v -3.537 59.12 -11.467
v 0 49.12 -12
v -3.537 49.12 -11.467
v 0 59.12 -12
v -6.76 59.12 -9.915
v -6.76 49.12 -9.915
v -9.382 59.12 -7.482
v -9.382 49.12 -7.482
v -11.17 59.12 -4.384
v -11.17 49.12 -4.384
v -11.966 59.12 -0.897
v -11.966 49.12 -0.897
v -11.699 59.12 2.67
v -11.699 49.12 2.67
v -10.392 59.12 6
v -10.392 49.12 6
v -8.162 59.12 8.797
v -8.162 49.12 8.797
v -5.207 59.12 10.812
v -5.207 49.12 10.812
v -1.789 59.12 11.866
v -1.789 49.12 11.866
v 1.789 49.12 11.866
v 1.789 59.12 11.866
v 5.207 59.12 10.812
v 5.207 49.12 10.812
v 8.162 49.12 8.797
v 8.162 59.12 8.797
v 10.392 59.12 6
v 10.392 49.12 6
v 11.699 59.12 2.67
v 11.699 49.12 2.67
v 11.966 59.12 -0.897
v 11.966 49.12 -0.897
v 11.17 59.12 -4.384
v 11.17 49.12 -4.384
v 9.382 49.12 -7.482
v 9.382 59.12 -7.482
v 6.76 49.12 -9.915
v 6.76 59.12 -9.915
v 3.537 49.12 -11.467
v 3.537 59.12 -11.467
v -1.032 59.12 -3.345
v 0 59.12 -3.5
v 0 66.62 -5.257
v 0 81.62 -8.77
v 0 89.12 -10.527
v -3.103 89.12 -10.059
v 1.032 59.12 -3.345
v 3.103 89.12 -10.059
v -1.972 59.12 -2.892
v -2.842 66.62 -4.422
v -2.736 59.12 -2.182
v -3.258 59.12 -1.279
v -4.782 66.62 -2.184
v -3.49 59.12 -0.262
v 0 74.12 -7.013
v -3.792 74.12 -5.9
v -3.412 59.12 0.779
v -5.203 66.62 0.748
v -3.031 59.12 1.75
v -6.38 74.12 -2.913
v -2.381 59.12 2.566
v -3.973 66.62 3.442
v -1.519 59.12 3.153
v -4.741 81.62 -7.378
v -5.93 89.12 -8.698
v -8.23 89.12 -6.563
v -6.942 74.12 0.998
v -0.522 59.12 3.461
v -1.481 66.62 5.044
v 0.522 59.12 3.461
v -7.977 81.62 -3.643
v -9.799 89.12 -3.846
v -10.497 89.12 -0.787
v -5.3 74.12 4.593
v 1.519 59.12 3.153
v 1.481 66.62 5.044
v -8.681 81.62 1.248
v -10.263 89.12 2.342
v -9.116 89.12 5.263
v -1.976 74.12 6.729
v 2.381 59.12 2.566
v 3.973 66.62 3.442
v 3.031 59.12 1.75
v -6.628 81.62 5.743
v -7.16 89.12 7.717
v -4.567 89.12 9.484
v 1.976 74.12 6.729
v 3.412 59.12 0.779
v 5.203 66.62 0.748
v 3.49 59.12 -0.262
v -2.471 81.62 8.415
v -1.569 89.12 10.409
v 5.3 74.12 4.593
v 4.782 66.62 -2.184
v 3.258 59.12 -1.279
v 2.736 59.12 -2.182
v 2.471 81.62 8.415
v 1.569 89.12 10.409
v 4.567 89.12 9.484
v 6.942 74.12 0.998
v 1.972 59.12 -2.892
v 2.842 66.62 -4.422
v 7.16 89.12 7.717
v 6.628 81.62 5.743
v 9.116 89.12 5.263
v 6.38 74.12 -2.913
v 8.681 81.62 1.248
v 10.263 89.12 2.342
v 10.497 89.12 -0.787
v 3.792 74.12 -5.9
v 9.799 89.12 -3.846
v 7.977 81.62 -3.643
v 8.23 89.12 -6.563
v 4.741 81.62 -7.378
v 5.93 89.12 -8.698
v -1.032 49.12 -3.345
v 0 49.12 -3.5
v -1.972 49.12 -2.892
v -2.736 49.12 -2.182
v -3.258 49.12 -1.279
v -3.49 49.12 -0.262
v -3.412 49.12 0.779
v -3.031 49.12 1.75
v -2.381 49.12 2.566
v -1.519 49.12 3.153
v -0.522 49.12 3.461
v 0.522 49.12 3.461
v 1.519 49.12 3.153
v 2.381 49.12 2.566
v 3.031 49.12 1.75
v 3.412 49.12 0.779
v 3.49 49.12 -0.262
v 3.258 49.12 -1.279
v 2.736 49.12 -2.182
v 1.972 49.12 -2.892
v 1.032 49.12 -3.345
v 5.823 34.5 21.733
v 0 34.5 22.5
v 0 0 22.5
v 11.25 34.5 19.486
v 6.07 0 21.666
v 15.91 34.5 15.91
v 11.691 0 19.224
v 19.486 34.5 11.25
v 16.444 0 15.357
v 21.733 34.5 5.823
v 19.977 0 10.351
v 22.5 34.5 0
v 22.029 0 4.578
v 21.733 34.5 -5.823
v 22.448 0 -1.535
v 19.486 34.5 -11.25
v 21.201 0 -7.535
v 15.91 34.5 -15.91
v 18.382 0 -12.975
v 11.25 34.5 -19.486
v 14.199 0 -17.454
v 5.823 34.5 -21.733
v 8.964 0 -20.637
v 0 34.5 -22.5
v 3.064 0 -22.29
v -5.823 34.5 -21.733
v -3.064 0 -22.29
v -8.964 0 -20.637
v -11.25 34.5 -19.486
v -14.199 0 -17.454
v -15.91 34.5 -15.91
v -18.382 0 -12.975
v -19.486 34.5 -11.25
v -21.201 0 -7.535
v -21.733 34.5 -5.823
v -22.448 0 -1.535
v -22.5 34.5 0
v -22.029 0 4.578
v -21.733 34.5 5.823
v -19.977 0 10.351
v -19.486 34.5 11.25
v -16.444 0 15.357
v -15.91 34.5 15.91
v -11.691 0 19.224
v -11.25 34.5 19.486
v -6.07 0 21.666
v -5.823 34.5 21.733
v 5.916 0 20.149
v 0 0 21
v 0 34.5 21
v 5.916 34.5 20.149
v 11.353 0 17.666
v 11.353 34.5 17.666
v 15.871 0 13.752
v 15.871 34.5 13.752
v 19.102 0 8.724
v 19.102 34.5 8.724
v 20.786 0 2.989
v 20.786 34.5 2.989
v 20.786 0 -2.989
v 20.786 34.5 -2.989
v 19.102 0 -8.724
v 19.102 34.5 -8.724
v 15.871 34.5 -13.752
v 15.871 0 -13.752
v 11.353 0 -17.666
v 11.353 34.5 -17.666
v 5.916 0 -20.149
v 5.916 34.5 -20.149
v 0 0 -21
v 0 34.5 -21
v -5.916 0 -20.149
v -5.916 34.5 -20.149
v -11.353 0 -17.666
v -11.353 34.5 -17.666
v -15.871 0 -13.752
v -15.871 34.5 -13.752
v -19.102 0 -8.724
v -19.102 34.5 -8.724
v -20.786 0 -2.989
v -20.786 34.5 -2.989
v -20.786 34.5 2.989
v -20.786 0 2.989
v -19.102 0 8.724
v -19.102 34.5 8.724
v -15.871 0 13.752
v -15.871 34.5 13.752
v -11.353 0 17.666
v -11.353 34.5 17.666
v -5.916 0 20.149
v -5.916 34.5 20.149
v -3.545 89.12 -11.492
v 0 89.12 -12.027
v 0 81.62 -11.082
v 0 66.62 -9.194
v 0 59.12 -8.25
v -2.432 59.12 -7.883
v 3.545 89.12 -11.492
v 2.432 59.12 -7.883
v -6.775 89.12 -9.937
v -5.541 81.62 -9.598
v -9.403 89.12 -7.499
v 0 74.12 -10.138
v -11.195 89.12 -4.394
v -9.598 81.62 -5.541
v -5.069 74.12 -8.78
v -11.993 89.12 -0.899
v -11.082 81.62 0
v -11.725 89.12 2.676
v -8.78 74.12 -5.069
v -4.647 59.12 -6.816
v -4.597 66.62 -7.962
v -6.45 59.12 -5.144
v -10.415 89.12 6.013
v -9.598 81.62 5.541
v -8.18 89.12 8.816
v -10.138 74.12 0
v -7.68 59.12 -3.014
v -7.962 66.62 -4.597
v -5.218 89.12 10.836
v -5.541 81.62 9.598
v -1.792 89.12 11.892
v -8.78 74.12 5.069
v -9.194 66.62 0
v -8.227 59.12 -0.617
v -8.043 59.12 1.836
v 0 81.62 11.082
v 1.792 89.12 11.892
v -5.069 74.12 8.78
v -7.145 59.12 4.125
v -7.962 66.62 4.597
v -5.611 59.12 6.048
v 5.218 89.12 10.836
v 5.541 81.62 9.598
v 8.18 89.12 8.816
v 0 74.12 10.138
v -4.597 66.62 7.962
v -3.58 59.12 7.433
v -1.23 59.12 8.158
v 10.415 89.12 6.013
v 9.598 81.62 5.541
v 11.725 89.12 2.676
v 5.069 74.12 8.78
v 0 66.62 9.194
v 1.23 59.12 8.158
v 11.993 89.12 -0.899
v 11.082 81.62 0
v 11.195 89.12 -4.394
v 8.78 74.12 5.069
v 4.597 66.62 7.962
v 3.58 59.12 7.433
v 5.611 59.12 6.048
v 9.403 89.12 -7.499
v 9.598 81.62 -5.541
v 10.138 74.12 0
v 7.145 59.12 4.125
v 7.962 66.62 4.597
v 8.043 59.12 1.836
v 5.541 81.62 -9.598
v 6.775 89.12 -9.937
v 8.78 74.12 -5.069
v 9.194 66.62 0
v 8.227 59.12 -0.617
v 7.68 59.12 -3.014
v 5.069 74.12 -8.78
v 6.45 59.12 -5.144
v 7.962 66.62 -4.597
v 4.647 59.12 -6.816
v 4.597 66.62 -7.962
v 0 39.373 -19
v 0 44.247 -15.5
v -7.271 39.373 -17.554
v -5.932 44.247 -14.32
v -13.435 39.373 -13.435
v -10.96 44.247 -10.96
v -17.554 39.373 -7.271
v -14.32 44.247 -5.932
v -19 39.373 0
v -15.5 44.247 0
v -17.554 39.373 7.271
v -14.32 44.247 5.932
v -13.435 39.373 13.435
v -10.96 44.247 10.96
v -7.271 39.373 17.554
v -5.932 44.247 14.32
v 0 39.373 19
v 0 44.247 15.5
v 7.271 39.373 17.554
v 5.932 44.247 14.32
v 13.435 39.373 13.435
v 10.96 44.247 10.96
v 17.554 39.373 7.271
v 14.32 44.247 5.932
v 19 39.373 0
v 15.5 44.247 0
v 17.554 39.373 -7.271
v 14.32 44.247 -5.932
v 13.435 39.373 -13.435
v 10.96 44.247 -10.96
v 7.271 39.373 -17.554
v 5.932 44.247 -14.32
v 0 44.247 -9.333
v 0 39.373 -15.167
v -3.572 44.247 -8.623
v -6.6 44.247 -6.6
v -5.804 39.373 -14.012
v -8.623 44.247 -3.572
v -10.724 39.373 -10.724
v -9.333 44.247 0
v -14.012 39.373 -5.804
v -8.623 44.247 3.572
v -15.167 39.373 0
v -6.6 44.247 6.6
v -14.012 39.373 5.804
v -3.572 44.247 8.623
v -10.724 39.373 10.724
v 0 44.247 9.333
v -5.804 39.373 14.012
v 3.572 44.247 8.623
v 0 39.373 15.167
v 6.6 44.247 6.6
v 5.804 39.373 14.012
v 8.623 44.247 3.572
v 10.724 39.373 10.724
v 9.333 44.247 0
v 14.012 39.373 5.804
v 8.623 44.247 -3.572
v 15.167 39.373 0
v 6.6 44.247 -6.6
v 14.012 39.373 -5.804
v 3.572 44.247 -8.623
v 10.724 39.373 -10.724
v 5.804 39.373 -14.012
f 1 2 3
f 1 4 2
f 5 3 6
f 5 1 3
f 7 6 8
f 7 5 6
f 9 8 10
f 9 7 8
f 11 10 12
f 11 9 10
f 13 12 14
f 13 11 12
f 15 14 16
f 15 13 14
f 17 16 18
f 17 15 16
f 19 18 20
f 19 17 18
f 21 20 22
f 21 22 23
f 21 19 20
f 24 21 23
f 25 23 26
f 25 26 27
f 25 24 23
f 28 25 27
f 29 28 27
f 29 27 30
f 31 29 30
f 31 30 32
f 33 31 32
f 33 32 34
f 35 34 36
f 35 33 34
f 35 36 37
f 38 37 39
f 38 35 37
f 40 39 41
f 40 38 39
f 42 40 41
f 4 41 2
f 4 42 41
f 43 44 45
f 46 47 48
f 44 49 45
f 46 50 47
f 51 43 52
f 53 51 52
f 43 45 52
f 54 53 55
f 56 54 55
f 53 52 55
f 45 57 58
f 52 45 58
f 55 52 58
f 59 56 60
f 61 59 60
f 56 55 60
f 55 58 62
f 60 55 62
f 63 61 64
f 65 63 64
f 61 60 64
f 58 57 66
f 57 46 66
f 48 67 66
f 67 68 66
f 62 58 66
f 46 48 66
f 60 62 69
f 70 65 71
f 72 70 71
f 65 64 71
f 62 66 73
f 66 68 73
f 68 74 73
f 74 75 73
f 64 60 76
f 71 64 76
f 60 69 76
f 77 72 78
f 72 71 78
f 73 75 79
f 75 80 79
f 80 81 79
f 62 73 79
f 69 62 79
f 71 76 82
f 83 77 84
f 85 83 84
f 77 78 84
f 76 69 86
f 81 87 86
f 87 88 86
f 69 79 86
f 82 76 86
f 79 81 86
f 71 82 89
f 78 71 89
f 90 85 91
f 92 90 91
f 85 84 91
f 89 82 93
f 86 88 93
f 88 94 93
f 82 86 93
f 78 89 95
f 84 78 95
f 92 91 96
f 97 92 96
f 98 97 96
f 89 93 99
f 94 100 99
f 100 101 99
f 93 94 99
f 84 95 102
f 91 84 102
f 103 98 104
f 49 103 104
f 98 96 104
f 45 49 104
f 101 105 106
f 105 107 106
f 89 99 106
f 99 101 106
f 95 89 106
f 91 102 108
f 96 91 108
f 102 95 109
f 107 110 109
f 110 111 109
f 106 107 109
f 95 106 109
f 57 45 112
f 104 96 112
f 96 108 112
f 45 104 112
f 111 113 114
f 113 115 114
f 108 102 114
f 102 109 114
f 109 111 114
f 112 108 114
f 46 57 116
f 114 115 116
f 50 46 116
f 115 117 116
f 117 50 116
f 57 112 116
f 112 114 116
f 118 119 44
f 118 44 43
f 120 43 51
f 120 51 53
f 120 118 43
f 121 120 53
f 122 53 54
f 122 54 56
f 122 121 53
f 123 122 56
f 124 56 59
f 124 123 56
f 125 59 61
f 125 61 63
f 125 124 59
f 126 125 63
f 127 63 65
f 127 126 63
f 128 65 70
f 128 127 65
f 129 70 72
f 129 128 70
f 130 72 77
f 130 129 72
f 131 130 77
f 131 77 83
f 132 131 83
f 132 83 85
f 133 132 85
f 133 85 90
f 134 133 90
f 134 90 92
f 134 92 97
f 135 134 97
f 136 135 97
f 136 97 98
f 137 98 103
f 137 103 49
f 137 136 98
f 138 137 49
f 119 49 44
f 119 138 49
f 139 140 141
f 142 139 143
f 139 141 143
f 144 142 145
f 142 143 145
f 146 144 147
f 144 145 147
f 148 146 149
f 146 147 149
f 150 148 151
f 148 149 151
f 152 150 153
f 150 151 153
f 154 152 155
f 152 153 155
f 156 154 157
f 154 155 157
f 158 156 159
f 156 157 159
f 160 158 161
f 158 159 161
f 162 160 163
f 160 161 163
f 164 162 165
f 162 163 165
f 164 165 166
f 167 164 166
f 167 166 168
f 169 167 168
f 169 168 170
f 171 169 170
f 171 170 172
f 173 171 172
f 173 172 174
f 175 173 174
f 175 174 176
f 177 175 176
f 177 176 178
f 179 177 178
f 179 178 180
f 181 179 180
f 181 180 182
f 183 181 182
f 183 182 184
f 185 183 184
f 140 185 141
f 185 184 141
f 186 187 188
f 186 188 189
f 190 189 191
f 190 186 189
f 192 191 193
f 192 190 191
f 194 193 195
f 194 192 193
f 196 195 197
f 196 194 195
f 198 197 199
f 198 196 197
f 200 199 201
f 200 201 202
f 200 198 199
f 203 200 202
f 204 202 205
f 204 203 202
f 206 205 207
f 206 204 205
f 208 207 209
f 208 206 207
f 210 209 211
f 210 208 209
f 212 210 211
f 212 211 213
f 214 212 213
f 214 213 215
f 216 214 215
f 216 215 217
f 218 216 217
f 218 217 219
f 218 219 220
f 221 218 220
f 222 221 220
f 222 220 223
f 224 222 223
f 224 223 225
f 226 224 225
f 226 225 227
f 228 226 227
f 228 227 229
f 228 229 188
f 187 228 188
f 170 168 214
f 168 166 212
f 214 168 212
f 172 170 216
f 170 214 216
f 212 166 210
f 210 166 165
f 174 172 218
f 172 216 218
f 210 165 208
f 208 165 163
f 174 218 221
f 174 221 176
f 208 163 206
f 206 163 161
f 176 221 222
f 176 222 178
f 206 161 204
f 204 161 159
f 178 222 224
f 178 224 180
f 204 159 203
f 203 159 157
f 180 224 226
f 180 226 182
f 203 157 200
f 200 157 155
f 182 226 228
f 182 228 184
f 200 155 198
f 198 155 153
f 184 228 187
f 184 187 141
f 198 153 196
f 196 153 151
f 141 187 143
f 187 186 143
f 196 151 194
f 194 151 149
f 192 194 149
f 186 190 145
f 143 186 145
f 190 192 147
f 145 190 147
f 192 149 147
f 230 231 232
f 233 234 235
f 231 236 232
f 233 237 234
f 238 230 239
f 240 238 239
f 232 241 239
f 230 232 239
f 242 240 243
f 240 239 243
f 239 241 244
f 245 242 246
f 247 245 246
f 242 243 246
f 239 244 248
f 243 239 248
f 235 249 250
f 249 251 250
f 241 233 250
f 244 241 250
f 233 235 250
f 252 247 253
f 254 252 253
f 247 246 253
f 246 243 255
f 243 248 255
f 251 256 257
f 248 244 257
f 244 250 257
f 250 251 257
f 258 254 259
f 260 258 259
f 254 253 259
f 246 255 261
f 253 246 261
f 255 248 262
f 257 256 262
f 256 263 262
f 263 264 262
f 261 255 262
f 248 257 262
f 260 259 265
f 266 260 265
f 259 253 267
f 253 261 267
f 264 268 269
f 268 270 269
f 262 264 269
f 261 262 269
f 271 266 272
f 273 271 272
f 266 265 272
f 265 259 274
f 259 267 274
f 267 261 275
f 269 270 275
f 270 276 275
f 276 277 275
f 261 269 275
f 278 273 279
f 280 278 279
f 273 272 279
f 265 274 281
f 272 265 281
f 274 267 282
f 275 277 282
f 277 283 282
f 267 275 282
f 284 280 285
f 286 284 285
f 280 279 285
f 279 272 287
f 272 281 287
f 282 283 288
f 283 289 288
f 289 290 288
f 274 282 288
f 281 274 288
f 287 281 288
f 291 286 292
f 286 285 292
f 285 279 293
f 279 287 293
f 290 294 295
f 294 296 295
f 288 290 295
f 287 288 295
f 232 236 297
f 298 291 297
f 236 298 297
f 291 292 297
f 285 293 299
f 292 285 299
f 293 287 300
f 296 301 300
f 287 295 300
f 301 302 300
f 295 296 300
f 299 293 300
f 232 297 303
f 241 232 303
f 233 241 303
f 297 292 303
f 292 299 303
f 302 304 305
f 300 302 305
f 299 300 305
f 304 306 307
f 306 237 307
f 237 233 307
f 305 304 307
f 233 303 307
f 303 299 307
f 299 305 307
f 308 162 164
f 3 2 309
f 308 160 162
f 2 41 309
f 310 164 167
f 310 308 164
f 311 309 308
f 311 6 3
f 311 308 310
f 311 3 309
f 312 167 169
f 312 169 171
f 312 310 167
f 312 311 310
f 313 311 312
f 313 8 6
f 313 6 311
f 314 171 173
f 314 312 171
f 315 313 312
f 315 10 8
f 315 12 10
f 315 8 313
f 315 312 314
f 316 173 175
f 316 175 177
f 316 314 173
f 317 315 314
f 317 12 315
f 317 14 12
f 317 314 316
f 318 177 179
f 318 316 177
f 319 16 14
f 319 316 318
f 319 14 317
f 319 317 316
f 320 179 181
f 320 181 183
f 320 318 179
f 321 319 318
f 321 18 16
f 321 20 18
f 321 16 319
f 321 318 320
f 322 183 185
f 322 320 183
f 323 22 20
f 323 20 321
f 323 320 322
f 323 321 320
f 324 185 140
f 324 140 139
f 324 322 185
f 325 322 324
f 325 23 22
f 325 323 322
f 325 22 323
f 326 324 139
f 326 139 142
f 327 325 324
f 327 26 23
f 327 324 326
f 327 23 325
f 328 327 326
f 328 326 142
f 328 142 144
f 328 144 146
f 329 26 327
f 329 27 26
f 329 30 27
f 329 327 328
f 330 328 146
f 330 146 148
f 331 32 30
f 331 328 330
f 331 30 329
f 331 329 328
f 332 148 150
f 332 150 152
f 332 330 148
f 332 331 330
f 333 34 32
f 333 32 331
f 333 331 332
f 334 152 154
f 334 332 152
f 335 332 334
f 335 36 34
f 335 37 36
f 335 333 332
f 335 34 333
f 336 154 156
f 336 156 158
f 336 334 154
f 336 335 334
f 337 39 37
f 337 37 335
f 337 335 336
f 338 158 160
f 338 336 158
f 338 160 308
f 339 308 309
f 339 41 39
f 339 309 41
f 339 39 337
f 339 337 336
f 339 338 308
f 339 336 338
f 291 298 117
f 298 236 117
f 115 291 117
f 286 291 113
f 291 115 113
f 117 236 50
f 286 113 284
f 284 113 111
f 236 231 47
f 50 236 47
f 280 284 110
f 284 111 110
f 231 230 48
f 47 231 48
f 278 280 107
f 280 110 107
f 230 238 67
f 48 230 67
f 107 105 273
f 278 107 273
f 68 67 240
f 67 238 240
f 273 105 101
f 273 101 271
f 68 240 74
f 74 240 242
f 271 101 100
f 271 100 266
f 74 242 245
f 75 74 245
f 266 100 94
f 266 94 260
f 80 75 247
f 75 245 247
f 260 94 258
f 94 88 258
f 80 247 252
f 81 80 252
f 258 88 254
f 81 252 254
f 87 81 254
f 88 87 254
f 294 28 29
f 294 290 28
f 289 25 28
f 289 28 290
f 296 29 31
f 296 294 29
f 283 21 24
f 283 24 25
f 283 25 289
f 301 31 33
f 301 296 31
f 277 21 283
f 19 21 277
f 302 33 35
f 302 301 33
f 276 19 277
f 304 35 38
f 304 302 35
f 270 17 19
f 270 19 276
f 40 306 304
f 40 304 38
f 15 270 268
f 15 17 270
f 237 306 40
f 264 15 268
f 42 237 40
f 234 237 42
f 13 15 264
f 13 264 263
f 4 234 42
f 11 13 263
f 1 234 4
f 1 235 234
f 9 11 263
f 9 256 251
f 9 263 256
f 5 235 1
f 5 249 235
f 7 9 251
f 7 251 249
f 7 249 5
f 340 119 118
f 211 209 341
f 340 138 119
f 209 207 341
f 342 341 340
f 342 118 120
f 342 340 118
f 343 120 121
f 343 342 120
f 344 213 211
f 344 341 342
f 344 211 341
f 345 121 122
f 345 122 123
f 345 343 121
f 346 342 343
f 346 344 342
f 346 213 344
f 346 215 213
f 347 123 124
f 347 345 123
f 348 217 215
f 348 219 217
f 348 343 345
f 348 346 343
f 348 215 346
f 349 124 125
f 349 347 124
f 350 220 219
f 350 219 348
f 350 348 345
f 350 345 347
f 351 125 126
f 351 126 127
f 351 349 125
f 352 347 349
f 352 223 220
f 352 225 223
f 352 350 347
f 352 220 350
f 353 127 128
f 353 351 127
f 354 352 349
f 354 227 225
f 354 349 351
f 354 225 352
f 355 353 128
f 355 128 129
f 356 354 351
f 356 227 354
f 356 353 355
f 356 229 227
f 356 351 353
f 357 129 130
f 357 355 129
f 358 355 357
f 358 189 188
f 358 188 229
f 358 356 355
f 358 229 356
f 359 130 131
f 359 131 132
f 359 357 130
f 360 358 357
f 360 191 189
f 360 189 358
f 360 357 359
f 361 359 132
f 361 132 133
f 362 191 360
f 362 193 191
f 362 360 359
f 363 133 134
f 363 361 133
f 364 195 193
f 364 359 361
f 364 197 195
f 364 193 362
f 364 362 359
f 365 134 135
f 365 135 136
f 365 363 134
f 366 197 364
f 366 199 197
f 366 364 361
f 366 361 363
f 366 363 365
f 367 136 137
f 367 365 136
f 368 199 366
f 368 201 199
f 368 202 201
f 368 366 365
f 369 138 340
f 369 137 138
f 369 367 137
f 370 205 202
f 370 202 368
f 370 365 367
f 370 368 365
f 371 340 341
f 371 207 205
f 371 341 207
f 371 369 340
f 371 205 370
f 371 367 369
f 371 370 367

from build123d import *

# Parameters (mm, degrees)
SKETCH1_R           = 22.5
SKETCH1_R_2         = 21
BOSS_EXTRUDE1_DEPTH = 34.5


with BuildPart() as part:
    # Sketch1 → Boss-Extrude1 (new body)
    with BuildSketch(Plane(origin=(0, 0, 0), x_dir=(1, 0, 0), z_dir=(0, 1, 0))):
        with Locations(Location((0, 0, 0), (0, 0, 270))):
            Circle(SKETCH1_R)
        with Locations(Location((0, 0, 0), (0, 0, 270))):
            Circle(SKETCH1_R_2, mode=Mode.SUBTRACT)
    extrude(amount=BOSS_EXTRUDE1_DEPTH)

    # Sketch5 → Revolve1 (revolve)
    with BuildSketch(Plane.XY, mode=Mode.PRIVATE) as revolve1_sk:
        Polygon((22.5, 34.5), (12, 49.120191517), (12, 59.120191517), (3.5, 59.120191517), (3.5, 49.120191517), (21, 34.5), align=None)
    revolve(revolve1_sk.sketch.rotate(Axis((0, 0, 0), (0, 1, 0)), 90), axis=Axis((0, 0, 0), (0, 1, 0)))

    # Sketch10 → Revolve3 (revolve)
    with BuildSketch(Plane(origin=(0, 0, 0), x_dir=(-1, 0, 0), z_dir=(0, 0, -1)), mode=Mode.PRIVATE) as revolve3_sk:
        Polygon((-3.5, 59.120191517), (-10.526661033, 89.120191517), (-12.026661033, 89.120191517), (-8.25, 59.120191517), align=None)
    revolve(revolve3_sk.sketch.rotate(Axis((0, 59.120191517, 0), (0, 1, 0)), 90), axis=Axis((0, 59.120191517, 0), (0, 1, 0)))


solid = part.part
